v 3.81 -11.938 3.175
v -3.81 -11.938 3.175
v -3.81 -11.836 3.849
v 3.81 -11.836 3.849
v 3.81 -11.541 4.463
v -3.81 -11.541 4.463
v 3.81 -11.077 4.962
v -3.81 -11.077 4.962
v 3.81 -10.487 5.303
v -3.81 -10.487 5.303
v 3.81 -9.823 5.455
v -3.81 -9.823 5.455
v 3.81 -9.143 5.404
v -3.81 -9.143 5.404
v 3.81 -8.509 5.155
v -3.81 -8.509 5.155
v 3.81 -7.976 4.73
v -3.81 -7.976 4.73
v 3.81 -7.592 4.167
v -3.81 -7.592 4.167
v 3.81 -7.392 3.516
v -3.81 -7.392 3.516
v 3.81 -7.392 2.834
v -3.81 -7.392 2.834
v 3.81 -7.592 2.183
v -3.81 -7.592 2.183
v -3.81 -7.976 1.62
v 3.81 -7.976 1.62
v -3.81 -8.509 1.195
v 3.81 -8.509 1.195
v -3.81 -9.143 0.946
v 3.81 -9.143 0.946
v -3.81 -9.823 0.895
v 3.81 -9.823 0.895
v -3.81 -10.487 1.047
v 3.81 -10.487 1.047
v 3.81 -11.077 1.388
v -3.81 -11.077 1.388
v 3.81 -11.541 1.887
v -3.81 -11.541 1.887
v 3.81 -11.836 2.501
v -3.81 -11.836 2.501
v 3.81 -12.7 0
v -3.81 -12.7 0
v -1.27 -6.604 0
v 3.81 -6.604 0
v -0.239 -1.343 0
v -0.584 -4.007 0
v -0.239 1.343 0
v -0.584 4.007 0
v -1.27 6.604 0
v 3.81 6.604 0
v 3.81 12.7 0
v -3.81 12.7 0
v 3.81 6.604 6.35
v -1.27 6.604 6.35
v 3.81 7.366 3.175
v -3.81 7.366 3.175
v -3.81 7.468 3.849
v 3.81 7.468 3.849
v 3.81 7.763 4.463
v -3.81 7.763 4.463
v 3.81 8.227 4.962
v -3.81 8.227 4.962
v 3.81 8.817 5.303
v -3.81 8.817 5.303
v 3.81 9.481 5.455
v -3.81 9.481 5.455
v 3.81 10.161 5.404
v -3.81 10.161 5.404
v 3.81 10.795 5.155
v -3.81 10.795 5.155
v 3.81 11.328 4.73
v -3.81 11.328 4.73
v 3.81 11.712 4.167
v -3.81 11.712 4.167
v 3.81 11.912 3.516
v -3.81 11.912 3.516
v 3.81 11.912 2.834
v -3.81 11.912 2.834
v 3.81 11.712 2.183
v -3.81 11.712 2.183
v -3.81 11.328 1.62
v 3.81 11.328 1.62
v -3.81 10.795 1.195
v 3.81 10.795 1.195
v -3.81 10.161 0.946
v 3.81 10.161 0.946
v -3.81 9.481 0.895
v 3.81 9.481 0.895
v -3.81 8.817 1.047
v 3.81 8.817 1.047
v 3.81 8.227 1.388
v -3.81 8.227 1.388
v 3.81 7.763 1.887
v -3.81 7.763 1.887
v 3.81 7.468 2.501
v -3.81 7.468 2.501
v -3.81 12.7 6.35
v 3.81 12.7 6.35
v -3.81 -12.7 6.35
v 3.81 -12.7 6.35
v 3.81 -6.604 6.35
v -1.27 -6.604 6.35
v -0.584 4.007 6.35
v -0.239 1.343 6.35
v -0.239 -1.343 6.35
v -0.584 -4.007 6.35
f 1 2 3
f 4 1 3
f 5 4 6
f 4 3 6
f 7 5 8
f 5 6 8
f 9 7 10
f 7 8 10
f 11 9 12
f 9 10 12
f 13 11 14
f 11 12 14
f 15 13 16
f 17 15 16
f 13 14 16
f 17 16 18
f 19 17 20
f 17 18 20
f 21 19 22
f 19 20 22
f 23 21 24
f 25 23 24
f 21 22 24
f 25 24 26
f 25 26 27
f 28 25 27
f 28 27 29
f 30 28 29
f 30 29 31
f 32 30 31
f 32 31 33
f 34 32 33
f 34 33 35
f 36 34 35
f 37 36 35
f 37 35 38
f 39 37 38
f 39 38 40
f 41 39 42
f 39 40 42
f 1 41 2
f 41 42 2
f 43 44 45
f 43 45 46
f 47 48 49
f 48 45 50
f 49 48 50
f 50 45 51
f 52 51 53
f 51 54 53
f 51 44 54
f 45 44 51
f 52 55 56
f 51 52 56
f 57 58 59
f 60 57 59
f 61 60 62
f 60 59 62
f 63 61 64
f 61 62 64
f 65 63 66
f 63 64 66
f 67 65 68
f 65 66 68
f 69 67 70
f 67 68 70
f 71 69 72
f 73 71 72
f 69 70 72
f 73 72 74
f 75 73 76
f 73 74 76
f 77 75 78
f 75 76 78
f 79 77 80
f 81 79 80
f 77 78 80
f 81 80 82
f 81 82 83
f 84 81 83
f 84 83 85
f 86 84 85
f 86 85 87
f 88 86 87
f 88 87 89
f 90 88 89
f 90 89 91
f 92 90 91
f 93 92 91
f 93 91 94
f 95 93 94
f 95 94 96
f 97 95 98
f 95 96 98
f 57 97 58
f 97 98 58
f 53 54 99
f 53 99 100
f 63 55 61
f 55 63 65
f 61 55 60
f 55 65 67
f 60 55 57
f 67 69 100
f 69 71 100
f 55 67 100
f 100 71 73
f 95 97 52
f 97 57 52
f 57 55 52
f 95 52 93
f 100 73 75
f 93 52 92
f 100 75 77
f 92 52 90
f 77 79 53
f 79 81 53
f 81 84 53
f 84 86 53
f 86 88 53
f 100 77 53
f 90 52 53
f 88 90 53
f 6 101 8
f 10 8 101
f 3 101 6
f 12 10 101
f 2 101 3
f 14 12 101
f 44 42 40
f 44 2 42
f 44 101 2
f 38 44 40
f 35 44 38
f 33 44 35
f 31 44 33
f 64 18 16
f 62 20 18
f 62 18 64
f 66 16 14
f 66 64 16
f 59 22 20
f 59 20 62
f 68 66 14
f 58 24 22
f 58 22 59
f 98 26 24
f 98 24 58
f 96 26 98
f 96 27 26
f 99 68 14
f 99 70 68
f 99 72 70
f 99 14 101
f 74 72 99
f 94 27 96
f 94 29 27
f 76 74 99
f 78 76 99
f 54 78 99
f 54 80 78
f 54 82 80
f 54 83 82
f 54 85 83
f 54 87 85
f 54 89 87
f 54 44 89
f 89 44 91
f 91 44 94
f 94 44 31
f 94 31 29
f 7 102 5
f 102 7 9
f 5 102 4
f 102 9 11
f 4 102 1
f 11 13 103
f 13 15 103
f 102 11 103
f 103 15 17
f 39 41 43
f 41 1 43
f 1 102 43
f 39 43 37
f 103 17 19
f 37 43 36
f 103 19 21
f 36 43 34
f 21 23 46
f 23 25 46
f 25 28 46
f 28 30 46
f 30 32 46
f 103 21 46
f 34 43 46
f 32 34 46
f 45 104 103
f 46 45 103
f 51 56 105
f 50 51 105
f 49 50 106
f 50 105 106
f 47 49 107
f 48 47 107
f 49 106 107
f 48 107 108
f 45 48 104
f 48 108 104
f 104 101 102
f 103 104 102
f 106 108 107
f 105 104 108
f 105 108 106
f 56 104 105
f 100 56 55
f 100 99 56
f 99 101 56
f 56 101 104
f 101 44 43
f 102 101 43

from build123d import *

# Parameters (mm, degrees)
F0_W     = 7.62
F0_H     = 25.4
F1_DEPTH = 6.35
F3_DEPTH = 6.35
F4_R     = 2.286
F5_DEPTH = 7.62


with BuildPart() as f1:
    # F0 (on Top) → F1 (new body)
    with BuildSketch(Plane.XY):
        Rectangle(F0_W, F0_H)
    extrude(amount=F1_DEPTH)

    # F2 (on face) → F3 (cut, through all)
    with BuildSketch(Plane.XY.offset(6.35)):
        with BuildLine():
            ThreePointArc((-1.27, 6.604), (-0.195298, 0), (-1.27, -6.604))
            Line((-1.27, -6.604), (3.81, -6.604))
            Line((3.81, -6.604), (3.81, 6.604))
            Line((3.81, 6.604), (-1.27, 6.604))
        make_face()
    extrude(amount=-F3_DEPTH, mode=Mode.SUBTRACT)

    # F4 (on face) → F5 (cut, through all)
    with BuildSketch(Plane(origin=(-3.81, 0, 0), x_dir=(0, -1, 0), z_dir=(-1, 0, 0))):
        with Locations((-9.652, 3.175)):
            Circle(F4_R)
        with Locations((9.652, 3.175)):
            Circle(F4_R)
    extrude(amount=-F5_DEPTH, mode=Mode.SUBTRACT)


solid = f1.part
